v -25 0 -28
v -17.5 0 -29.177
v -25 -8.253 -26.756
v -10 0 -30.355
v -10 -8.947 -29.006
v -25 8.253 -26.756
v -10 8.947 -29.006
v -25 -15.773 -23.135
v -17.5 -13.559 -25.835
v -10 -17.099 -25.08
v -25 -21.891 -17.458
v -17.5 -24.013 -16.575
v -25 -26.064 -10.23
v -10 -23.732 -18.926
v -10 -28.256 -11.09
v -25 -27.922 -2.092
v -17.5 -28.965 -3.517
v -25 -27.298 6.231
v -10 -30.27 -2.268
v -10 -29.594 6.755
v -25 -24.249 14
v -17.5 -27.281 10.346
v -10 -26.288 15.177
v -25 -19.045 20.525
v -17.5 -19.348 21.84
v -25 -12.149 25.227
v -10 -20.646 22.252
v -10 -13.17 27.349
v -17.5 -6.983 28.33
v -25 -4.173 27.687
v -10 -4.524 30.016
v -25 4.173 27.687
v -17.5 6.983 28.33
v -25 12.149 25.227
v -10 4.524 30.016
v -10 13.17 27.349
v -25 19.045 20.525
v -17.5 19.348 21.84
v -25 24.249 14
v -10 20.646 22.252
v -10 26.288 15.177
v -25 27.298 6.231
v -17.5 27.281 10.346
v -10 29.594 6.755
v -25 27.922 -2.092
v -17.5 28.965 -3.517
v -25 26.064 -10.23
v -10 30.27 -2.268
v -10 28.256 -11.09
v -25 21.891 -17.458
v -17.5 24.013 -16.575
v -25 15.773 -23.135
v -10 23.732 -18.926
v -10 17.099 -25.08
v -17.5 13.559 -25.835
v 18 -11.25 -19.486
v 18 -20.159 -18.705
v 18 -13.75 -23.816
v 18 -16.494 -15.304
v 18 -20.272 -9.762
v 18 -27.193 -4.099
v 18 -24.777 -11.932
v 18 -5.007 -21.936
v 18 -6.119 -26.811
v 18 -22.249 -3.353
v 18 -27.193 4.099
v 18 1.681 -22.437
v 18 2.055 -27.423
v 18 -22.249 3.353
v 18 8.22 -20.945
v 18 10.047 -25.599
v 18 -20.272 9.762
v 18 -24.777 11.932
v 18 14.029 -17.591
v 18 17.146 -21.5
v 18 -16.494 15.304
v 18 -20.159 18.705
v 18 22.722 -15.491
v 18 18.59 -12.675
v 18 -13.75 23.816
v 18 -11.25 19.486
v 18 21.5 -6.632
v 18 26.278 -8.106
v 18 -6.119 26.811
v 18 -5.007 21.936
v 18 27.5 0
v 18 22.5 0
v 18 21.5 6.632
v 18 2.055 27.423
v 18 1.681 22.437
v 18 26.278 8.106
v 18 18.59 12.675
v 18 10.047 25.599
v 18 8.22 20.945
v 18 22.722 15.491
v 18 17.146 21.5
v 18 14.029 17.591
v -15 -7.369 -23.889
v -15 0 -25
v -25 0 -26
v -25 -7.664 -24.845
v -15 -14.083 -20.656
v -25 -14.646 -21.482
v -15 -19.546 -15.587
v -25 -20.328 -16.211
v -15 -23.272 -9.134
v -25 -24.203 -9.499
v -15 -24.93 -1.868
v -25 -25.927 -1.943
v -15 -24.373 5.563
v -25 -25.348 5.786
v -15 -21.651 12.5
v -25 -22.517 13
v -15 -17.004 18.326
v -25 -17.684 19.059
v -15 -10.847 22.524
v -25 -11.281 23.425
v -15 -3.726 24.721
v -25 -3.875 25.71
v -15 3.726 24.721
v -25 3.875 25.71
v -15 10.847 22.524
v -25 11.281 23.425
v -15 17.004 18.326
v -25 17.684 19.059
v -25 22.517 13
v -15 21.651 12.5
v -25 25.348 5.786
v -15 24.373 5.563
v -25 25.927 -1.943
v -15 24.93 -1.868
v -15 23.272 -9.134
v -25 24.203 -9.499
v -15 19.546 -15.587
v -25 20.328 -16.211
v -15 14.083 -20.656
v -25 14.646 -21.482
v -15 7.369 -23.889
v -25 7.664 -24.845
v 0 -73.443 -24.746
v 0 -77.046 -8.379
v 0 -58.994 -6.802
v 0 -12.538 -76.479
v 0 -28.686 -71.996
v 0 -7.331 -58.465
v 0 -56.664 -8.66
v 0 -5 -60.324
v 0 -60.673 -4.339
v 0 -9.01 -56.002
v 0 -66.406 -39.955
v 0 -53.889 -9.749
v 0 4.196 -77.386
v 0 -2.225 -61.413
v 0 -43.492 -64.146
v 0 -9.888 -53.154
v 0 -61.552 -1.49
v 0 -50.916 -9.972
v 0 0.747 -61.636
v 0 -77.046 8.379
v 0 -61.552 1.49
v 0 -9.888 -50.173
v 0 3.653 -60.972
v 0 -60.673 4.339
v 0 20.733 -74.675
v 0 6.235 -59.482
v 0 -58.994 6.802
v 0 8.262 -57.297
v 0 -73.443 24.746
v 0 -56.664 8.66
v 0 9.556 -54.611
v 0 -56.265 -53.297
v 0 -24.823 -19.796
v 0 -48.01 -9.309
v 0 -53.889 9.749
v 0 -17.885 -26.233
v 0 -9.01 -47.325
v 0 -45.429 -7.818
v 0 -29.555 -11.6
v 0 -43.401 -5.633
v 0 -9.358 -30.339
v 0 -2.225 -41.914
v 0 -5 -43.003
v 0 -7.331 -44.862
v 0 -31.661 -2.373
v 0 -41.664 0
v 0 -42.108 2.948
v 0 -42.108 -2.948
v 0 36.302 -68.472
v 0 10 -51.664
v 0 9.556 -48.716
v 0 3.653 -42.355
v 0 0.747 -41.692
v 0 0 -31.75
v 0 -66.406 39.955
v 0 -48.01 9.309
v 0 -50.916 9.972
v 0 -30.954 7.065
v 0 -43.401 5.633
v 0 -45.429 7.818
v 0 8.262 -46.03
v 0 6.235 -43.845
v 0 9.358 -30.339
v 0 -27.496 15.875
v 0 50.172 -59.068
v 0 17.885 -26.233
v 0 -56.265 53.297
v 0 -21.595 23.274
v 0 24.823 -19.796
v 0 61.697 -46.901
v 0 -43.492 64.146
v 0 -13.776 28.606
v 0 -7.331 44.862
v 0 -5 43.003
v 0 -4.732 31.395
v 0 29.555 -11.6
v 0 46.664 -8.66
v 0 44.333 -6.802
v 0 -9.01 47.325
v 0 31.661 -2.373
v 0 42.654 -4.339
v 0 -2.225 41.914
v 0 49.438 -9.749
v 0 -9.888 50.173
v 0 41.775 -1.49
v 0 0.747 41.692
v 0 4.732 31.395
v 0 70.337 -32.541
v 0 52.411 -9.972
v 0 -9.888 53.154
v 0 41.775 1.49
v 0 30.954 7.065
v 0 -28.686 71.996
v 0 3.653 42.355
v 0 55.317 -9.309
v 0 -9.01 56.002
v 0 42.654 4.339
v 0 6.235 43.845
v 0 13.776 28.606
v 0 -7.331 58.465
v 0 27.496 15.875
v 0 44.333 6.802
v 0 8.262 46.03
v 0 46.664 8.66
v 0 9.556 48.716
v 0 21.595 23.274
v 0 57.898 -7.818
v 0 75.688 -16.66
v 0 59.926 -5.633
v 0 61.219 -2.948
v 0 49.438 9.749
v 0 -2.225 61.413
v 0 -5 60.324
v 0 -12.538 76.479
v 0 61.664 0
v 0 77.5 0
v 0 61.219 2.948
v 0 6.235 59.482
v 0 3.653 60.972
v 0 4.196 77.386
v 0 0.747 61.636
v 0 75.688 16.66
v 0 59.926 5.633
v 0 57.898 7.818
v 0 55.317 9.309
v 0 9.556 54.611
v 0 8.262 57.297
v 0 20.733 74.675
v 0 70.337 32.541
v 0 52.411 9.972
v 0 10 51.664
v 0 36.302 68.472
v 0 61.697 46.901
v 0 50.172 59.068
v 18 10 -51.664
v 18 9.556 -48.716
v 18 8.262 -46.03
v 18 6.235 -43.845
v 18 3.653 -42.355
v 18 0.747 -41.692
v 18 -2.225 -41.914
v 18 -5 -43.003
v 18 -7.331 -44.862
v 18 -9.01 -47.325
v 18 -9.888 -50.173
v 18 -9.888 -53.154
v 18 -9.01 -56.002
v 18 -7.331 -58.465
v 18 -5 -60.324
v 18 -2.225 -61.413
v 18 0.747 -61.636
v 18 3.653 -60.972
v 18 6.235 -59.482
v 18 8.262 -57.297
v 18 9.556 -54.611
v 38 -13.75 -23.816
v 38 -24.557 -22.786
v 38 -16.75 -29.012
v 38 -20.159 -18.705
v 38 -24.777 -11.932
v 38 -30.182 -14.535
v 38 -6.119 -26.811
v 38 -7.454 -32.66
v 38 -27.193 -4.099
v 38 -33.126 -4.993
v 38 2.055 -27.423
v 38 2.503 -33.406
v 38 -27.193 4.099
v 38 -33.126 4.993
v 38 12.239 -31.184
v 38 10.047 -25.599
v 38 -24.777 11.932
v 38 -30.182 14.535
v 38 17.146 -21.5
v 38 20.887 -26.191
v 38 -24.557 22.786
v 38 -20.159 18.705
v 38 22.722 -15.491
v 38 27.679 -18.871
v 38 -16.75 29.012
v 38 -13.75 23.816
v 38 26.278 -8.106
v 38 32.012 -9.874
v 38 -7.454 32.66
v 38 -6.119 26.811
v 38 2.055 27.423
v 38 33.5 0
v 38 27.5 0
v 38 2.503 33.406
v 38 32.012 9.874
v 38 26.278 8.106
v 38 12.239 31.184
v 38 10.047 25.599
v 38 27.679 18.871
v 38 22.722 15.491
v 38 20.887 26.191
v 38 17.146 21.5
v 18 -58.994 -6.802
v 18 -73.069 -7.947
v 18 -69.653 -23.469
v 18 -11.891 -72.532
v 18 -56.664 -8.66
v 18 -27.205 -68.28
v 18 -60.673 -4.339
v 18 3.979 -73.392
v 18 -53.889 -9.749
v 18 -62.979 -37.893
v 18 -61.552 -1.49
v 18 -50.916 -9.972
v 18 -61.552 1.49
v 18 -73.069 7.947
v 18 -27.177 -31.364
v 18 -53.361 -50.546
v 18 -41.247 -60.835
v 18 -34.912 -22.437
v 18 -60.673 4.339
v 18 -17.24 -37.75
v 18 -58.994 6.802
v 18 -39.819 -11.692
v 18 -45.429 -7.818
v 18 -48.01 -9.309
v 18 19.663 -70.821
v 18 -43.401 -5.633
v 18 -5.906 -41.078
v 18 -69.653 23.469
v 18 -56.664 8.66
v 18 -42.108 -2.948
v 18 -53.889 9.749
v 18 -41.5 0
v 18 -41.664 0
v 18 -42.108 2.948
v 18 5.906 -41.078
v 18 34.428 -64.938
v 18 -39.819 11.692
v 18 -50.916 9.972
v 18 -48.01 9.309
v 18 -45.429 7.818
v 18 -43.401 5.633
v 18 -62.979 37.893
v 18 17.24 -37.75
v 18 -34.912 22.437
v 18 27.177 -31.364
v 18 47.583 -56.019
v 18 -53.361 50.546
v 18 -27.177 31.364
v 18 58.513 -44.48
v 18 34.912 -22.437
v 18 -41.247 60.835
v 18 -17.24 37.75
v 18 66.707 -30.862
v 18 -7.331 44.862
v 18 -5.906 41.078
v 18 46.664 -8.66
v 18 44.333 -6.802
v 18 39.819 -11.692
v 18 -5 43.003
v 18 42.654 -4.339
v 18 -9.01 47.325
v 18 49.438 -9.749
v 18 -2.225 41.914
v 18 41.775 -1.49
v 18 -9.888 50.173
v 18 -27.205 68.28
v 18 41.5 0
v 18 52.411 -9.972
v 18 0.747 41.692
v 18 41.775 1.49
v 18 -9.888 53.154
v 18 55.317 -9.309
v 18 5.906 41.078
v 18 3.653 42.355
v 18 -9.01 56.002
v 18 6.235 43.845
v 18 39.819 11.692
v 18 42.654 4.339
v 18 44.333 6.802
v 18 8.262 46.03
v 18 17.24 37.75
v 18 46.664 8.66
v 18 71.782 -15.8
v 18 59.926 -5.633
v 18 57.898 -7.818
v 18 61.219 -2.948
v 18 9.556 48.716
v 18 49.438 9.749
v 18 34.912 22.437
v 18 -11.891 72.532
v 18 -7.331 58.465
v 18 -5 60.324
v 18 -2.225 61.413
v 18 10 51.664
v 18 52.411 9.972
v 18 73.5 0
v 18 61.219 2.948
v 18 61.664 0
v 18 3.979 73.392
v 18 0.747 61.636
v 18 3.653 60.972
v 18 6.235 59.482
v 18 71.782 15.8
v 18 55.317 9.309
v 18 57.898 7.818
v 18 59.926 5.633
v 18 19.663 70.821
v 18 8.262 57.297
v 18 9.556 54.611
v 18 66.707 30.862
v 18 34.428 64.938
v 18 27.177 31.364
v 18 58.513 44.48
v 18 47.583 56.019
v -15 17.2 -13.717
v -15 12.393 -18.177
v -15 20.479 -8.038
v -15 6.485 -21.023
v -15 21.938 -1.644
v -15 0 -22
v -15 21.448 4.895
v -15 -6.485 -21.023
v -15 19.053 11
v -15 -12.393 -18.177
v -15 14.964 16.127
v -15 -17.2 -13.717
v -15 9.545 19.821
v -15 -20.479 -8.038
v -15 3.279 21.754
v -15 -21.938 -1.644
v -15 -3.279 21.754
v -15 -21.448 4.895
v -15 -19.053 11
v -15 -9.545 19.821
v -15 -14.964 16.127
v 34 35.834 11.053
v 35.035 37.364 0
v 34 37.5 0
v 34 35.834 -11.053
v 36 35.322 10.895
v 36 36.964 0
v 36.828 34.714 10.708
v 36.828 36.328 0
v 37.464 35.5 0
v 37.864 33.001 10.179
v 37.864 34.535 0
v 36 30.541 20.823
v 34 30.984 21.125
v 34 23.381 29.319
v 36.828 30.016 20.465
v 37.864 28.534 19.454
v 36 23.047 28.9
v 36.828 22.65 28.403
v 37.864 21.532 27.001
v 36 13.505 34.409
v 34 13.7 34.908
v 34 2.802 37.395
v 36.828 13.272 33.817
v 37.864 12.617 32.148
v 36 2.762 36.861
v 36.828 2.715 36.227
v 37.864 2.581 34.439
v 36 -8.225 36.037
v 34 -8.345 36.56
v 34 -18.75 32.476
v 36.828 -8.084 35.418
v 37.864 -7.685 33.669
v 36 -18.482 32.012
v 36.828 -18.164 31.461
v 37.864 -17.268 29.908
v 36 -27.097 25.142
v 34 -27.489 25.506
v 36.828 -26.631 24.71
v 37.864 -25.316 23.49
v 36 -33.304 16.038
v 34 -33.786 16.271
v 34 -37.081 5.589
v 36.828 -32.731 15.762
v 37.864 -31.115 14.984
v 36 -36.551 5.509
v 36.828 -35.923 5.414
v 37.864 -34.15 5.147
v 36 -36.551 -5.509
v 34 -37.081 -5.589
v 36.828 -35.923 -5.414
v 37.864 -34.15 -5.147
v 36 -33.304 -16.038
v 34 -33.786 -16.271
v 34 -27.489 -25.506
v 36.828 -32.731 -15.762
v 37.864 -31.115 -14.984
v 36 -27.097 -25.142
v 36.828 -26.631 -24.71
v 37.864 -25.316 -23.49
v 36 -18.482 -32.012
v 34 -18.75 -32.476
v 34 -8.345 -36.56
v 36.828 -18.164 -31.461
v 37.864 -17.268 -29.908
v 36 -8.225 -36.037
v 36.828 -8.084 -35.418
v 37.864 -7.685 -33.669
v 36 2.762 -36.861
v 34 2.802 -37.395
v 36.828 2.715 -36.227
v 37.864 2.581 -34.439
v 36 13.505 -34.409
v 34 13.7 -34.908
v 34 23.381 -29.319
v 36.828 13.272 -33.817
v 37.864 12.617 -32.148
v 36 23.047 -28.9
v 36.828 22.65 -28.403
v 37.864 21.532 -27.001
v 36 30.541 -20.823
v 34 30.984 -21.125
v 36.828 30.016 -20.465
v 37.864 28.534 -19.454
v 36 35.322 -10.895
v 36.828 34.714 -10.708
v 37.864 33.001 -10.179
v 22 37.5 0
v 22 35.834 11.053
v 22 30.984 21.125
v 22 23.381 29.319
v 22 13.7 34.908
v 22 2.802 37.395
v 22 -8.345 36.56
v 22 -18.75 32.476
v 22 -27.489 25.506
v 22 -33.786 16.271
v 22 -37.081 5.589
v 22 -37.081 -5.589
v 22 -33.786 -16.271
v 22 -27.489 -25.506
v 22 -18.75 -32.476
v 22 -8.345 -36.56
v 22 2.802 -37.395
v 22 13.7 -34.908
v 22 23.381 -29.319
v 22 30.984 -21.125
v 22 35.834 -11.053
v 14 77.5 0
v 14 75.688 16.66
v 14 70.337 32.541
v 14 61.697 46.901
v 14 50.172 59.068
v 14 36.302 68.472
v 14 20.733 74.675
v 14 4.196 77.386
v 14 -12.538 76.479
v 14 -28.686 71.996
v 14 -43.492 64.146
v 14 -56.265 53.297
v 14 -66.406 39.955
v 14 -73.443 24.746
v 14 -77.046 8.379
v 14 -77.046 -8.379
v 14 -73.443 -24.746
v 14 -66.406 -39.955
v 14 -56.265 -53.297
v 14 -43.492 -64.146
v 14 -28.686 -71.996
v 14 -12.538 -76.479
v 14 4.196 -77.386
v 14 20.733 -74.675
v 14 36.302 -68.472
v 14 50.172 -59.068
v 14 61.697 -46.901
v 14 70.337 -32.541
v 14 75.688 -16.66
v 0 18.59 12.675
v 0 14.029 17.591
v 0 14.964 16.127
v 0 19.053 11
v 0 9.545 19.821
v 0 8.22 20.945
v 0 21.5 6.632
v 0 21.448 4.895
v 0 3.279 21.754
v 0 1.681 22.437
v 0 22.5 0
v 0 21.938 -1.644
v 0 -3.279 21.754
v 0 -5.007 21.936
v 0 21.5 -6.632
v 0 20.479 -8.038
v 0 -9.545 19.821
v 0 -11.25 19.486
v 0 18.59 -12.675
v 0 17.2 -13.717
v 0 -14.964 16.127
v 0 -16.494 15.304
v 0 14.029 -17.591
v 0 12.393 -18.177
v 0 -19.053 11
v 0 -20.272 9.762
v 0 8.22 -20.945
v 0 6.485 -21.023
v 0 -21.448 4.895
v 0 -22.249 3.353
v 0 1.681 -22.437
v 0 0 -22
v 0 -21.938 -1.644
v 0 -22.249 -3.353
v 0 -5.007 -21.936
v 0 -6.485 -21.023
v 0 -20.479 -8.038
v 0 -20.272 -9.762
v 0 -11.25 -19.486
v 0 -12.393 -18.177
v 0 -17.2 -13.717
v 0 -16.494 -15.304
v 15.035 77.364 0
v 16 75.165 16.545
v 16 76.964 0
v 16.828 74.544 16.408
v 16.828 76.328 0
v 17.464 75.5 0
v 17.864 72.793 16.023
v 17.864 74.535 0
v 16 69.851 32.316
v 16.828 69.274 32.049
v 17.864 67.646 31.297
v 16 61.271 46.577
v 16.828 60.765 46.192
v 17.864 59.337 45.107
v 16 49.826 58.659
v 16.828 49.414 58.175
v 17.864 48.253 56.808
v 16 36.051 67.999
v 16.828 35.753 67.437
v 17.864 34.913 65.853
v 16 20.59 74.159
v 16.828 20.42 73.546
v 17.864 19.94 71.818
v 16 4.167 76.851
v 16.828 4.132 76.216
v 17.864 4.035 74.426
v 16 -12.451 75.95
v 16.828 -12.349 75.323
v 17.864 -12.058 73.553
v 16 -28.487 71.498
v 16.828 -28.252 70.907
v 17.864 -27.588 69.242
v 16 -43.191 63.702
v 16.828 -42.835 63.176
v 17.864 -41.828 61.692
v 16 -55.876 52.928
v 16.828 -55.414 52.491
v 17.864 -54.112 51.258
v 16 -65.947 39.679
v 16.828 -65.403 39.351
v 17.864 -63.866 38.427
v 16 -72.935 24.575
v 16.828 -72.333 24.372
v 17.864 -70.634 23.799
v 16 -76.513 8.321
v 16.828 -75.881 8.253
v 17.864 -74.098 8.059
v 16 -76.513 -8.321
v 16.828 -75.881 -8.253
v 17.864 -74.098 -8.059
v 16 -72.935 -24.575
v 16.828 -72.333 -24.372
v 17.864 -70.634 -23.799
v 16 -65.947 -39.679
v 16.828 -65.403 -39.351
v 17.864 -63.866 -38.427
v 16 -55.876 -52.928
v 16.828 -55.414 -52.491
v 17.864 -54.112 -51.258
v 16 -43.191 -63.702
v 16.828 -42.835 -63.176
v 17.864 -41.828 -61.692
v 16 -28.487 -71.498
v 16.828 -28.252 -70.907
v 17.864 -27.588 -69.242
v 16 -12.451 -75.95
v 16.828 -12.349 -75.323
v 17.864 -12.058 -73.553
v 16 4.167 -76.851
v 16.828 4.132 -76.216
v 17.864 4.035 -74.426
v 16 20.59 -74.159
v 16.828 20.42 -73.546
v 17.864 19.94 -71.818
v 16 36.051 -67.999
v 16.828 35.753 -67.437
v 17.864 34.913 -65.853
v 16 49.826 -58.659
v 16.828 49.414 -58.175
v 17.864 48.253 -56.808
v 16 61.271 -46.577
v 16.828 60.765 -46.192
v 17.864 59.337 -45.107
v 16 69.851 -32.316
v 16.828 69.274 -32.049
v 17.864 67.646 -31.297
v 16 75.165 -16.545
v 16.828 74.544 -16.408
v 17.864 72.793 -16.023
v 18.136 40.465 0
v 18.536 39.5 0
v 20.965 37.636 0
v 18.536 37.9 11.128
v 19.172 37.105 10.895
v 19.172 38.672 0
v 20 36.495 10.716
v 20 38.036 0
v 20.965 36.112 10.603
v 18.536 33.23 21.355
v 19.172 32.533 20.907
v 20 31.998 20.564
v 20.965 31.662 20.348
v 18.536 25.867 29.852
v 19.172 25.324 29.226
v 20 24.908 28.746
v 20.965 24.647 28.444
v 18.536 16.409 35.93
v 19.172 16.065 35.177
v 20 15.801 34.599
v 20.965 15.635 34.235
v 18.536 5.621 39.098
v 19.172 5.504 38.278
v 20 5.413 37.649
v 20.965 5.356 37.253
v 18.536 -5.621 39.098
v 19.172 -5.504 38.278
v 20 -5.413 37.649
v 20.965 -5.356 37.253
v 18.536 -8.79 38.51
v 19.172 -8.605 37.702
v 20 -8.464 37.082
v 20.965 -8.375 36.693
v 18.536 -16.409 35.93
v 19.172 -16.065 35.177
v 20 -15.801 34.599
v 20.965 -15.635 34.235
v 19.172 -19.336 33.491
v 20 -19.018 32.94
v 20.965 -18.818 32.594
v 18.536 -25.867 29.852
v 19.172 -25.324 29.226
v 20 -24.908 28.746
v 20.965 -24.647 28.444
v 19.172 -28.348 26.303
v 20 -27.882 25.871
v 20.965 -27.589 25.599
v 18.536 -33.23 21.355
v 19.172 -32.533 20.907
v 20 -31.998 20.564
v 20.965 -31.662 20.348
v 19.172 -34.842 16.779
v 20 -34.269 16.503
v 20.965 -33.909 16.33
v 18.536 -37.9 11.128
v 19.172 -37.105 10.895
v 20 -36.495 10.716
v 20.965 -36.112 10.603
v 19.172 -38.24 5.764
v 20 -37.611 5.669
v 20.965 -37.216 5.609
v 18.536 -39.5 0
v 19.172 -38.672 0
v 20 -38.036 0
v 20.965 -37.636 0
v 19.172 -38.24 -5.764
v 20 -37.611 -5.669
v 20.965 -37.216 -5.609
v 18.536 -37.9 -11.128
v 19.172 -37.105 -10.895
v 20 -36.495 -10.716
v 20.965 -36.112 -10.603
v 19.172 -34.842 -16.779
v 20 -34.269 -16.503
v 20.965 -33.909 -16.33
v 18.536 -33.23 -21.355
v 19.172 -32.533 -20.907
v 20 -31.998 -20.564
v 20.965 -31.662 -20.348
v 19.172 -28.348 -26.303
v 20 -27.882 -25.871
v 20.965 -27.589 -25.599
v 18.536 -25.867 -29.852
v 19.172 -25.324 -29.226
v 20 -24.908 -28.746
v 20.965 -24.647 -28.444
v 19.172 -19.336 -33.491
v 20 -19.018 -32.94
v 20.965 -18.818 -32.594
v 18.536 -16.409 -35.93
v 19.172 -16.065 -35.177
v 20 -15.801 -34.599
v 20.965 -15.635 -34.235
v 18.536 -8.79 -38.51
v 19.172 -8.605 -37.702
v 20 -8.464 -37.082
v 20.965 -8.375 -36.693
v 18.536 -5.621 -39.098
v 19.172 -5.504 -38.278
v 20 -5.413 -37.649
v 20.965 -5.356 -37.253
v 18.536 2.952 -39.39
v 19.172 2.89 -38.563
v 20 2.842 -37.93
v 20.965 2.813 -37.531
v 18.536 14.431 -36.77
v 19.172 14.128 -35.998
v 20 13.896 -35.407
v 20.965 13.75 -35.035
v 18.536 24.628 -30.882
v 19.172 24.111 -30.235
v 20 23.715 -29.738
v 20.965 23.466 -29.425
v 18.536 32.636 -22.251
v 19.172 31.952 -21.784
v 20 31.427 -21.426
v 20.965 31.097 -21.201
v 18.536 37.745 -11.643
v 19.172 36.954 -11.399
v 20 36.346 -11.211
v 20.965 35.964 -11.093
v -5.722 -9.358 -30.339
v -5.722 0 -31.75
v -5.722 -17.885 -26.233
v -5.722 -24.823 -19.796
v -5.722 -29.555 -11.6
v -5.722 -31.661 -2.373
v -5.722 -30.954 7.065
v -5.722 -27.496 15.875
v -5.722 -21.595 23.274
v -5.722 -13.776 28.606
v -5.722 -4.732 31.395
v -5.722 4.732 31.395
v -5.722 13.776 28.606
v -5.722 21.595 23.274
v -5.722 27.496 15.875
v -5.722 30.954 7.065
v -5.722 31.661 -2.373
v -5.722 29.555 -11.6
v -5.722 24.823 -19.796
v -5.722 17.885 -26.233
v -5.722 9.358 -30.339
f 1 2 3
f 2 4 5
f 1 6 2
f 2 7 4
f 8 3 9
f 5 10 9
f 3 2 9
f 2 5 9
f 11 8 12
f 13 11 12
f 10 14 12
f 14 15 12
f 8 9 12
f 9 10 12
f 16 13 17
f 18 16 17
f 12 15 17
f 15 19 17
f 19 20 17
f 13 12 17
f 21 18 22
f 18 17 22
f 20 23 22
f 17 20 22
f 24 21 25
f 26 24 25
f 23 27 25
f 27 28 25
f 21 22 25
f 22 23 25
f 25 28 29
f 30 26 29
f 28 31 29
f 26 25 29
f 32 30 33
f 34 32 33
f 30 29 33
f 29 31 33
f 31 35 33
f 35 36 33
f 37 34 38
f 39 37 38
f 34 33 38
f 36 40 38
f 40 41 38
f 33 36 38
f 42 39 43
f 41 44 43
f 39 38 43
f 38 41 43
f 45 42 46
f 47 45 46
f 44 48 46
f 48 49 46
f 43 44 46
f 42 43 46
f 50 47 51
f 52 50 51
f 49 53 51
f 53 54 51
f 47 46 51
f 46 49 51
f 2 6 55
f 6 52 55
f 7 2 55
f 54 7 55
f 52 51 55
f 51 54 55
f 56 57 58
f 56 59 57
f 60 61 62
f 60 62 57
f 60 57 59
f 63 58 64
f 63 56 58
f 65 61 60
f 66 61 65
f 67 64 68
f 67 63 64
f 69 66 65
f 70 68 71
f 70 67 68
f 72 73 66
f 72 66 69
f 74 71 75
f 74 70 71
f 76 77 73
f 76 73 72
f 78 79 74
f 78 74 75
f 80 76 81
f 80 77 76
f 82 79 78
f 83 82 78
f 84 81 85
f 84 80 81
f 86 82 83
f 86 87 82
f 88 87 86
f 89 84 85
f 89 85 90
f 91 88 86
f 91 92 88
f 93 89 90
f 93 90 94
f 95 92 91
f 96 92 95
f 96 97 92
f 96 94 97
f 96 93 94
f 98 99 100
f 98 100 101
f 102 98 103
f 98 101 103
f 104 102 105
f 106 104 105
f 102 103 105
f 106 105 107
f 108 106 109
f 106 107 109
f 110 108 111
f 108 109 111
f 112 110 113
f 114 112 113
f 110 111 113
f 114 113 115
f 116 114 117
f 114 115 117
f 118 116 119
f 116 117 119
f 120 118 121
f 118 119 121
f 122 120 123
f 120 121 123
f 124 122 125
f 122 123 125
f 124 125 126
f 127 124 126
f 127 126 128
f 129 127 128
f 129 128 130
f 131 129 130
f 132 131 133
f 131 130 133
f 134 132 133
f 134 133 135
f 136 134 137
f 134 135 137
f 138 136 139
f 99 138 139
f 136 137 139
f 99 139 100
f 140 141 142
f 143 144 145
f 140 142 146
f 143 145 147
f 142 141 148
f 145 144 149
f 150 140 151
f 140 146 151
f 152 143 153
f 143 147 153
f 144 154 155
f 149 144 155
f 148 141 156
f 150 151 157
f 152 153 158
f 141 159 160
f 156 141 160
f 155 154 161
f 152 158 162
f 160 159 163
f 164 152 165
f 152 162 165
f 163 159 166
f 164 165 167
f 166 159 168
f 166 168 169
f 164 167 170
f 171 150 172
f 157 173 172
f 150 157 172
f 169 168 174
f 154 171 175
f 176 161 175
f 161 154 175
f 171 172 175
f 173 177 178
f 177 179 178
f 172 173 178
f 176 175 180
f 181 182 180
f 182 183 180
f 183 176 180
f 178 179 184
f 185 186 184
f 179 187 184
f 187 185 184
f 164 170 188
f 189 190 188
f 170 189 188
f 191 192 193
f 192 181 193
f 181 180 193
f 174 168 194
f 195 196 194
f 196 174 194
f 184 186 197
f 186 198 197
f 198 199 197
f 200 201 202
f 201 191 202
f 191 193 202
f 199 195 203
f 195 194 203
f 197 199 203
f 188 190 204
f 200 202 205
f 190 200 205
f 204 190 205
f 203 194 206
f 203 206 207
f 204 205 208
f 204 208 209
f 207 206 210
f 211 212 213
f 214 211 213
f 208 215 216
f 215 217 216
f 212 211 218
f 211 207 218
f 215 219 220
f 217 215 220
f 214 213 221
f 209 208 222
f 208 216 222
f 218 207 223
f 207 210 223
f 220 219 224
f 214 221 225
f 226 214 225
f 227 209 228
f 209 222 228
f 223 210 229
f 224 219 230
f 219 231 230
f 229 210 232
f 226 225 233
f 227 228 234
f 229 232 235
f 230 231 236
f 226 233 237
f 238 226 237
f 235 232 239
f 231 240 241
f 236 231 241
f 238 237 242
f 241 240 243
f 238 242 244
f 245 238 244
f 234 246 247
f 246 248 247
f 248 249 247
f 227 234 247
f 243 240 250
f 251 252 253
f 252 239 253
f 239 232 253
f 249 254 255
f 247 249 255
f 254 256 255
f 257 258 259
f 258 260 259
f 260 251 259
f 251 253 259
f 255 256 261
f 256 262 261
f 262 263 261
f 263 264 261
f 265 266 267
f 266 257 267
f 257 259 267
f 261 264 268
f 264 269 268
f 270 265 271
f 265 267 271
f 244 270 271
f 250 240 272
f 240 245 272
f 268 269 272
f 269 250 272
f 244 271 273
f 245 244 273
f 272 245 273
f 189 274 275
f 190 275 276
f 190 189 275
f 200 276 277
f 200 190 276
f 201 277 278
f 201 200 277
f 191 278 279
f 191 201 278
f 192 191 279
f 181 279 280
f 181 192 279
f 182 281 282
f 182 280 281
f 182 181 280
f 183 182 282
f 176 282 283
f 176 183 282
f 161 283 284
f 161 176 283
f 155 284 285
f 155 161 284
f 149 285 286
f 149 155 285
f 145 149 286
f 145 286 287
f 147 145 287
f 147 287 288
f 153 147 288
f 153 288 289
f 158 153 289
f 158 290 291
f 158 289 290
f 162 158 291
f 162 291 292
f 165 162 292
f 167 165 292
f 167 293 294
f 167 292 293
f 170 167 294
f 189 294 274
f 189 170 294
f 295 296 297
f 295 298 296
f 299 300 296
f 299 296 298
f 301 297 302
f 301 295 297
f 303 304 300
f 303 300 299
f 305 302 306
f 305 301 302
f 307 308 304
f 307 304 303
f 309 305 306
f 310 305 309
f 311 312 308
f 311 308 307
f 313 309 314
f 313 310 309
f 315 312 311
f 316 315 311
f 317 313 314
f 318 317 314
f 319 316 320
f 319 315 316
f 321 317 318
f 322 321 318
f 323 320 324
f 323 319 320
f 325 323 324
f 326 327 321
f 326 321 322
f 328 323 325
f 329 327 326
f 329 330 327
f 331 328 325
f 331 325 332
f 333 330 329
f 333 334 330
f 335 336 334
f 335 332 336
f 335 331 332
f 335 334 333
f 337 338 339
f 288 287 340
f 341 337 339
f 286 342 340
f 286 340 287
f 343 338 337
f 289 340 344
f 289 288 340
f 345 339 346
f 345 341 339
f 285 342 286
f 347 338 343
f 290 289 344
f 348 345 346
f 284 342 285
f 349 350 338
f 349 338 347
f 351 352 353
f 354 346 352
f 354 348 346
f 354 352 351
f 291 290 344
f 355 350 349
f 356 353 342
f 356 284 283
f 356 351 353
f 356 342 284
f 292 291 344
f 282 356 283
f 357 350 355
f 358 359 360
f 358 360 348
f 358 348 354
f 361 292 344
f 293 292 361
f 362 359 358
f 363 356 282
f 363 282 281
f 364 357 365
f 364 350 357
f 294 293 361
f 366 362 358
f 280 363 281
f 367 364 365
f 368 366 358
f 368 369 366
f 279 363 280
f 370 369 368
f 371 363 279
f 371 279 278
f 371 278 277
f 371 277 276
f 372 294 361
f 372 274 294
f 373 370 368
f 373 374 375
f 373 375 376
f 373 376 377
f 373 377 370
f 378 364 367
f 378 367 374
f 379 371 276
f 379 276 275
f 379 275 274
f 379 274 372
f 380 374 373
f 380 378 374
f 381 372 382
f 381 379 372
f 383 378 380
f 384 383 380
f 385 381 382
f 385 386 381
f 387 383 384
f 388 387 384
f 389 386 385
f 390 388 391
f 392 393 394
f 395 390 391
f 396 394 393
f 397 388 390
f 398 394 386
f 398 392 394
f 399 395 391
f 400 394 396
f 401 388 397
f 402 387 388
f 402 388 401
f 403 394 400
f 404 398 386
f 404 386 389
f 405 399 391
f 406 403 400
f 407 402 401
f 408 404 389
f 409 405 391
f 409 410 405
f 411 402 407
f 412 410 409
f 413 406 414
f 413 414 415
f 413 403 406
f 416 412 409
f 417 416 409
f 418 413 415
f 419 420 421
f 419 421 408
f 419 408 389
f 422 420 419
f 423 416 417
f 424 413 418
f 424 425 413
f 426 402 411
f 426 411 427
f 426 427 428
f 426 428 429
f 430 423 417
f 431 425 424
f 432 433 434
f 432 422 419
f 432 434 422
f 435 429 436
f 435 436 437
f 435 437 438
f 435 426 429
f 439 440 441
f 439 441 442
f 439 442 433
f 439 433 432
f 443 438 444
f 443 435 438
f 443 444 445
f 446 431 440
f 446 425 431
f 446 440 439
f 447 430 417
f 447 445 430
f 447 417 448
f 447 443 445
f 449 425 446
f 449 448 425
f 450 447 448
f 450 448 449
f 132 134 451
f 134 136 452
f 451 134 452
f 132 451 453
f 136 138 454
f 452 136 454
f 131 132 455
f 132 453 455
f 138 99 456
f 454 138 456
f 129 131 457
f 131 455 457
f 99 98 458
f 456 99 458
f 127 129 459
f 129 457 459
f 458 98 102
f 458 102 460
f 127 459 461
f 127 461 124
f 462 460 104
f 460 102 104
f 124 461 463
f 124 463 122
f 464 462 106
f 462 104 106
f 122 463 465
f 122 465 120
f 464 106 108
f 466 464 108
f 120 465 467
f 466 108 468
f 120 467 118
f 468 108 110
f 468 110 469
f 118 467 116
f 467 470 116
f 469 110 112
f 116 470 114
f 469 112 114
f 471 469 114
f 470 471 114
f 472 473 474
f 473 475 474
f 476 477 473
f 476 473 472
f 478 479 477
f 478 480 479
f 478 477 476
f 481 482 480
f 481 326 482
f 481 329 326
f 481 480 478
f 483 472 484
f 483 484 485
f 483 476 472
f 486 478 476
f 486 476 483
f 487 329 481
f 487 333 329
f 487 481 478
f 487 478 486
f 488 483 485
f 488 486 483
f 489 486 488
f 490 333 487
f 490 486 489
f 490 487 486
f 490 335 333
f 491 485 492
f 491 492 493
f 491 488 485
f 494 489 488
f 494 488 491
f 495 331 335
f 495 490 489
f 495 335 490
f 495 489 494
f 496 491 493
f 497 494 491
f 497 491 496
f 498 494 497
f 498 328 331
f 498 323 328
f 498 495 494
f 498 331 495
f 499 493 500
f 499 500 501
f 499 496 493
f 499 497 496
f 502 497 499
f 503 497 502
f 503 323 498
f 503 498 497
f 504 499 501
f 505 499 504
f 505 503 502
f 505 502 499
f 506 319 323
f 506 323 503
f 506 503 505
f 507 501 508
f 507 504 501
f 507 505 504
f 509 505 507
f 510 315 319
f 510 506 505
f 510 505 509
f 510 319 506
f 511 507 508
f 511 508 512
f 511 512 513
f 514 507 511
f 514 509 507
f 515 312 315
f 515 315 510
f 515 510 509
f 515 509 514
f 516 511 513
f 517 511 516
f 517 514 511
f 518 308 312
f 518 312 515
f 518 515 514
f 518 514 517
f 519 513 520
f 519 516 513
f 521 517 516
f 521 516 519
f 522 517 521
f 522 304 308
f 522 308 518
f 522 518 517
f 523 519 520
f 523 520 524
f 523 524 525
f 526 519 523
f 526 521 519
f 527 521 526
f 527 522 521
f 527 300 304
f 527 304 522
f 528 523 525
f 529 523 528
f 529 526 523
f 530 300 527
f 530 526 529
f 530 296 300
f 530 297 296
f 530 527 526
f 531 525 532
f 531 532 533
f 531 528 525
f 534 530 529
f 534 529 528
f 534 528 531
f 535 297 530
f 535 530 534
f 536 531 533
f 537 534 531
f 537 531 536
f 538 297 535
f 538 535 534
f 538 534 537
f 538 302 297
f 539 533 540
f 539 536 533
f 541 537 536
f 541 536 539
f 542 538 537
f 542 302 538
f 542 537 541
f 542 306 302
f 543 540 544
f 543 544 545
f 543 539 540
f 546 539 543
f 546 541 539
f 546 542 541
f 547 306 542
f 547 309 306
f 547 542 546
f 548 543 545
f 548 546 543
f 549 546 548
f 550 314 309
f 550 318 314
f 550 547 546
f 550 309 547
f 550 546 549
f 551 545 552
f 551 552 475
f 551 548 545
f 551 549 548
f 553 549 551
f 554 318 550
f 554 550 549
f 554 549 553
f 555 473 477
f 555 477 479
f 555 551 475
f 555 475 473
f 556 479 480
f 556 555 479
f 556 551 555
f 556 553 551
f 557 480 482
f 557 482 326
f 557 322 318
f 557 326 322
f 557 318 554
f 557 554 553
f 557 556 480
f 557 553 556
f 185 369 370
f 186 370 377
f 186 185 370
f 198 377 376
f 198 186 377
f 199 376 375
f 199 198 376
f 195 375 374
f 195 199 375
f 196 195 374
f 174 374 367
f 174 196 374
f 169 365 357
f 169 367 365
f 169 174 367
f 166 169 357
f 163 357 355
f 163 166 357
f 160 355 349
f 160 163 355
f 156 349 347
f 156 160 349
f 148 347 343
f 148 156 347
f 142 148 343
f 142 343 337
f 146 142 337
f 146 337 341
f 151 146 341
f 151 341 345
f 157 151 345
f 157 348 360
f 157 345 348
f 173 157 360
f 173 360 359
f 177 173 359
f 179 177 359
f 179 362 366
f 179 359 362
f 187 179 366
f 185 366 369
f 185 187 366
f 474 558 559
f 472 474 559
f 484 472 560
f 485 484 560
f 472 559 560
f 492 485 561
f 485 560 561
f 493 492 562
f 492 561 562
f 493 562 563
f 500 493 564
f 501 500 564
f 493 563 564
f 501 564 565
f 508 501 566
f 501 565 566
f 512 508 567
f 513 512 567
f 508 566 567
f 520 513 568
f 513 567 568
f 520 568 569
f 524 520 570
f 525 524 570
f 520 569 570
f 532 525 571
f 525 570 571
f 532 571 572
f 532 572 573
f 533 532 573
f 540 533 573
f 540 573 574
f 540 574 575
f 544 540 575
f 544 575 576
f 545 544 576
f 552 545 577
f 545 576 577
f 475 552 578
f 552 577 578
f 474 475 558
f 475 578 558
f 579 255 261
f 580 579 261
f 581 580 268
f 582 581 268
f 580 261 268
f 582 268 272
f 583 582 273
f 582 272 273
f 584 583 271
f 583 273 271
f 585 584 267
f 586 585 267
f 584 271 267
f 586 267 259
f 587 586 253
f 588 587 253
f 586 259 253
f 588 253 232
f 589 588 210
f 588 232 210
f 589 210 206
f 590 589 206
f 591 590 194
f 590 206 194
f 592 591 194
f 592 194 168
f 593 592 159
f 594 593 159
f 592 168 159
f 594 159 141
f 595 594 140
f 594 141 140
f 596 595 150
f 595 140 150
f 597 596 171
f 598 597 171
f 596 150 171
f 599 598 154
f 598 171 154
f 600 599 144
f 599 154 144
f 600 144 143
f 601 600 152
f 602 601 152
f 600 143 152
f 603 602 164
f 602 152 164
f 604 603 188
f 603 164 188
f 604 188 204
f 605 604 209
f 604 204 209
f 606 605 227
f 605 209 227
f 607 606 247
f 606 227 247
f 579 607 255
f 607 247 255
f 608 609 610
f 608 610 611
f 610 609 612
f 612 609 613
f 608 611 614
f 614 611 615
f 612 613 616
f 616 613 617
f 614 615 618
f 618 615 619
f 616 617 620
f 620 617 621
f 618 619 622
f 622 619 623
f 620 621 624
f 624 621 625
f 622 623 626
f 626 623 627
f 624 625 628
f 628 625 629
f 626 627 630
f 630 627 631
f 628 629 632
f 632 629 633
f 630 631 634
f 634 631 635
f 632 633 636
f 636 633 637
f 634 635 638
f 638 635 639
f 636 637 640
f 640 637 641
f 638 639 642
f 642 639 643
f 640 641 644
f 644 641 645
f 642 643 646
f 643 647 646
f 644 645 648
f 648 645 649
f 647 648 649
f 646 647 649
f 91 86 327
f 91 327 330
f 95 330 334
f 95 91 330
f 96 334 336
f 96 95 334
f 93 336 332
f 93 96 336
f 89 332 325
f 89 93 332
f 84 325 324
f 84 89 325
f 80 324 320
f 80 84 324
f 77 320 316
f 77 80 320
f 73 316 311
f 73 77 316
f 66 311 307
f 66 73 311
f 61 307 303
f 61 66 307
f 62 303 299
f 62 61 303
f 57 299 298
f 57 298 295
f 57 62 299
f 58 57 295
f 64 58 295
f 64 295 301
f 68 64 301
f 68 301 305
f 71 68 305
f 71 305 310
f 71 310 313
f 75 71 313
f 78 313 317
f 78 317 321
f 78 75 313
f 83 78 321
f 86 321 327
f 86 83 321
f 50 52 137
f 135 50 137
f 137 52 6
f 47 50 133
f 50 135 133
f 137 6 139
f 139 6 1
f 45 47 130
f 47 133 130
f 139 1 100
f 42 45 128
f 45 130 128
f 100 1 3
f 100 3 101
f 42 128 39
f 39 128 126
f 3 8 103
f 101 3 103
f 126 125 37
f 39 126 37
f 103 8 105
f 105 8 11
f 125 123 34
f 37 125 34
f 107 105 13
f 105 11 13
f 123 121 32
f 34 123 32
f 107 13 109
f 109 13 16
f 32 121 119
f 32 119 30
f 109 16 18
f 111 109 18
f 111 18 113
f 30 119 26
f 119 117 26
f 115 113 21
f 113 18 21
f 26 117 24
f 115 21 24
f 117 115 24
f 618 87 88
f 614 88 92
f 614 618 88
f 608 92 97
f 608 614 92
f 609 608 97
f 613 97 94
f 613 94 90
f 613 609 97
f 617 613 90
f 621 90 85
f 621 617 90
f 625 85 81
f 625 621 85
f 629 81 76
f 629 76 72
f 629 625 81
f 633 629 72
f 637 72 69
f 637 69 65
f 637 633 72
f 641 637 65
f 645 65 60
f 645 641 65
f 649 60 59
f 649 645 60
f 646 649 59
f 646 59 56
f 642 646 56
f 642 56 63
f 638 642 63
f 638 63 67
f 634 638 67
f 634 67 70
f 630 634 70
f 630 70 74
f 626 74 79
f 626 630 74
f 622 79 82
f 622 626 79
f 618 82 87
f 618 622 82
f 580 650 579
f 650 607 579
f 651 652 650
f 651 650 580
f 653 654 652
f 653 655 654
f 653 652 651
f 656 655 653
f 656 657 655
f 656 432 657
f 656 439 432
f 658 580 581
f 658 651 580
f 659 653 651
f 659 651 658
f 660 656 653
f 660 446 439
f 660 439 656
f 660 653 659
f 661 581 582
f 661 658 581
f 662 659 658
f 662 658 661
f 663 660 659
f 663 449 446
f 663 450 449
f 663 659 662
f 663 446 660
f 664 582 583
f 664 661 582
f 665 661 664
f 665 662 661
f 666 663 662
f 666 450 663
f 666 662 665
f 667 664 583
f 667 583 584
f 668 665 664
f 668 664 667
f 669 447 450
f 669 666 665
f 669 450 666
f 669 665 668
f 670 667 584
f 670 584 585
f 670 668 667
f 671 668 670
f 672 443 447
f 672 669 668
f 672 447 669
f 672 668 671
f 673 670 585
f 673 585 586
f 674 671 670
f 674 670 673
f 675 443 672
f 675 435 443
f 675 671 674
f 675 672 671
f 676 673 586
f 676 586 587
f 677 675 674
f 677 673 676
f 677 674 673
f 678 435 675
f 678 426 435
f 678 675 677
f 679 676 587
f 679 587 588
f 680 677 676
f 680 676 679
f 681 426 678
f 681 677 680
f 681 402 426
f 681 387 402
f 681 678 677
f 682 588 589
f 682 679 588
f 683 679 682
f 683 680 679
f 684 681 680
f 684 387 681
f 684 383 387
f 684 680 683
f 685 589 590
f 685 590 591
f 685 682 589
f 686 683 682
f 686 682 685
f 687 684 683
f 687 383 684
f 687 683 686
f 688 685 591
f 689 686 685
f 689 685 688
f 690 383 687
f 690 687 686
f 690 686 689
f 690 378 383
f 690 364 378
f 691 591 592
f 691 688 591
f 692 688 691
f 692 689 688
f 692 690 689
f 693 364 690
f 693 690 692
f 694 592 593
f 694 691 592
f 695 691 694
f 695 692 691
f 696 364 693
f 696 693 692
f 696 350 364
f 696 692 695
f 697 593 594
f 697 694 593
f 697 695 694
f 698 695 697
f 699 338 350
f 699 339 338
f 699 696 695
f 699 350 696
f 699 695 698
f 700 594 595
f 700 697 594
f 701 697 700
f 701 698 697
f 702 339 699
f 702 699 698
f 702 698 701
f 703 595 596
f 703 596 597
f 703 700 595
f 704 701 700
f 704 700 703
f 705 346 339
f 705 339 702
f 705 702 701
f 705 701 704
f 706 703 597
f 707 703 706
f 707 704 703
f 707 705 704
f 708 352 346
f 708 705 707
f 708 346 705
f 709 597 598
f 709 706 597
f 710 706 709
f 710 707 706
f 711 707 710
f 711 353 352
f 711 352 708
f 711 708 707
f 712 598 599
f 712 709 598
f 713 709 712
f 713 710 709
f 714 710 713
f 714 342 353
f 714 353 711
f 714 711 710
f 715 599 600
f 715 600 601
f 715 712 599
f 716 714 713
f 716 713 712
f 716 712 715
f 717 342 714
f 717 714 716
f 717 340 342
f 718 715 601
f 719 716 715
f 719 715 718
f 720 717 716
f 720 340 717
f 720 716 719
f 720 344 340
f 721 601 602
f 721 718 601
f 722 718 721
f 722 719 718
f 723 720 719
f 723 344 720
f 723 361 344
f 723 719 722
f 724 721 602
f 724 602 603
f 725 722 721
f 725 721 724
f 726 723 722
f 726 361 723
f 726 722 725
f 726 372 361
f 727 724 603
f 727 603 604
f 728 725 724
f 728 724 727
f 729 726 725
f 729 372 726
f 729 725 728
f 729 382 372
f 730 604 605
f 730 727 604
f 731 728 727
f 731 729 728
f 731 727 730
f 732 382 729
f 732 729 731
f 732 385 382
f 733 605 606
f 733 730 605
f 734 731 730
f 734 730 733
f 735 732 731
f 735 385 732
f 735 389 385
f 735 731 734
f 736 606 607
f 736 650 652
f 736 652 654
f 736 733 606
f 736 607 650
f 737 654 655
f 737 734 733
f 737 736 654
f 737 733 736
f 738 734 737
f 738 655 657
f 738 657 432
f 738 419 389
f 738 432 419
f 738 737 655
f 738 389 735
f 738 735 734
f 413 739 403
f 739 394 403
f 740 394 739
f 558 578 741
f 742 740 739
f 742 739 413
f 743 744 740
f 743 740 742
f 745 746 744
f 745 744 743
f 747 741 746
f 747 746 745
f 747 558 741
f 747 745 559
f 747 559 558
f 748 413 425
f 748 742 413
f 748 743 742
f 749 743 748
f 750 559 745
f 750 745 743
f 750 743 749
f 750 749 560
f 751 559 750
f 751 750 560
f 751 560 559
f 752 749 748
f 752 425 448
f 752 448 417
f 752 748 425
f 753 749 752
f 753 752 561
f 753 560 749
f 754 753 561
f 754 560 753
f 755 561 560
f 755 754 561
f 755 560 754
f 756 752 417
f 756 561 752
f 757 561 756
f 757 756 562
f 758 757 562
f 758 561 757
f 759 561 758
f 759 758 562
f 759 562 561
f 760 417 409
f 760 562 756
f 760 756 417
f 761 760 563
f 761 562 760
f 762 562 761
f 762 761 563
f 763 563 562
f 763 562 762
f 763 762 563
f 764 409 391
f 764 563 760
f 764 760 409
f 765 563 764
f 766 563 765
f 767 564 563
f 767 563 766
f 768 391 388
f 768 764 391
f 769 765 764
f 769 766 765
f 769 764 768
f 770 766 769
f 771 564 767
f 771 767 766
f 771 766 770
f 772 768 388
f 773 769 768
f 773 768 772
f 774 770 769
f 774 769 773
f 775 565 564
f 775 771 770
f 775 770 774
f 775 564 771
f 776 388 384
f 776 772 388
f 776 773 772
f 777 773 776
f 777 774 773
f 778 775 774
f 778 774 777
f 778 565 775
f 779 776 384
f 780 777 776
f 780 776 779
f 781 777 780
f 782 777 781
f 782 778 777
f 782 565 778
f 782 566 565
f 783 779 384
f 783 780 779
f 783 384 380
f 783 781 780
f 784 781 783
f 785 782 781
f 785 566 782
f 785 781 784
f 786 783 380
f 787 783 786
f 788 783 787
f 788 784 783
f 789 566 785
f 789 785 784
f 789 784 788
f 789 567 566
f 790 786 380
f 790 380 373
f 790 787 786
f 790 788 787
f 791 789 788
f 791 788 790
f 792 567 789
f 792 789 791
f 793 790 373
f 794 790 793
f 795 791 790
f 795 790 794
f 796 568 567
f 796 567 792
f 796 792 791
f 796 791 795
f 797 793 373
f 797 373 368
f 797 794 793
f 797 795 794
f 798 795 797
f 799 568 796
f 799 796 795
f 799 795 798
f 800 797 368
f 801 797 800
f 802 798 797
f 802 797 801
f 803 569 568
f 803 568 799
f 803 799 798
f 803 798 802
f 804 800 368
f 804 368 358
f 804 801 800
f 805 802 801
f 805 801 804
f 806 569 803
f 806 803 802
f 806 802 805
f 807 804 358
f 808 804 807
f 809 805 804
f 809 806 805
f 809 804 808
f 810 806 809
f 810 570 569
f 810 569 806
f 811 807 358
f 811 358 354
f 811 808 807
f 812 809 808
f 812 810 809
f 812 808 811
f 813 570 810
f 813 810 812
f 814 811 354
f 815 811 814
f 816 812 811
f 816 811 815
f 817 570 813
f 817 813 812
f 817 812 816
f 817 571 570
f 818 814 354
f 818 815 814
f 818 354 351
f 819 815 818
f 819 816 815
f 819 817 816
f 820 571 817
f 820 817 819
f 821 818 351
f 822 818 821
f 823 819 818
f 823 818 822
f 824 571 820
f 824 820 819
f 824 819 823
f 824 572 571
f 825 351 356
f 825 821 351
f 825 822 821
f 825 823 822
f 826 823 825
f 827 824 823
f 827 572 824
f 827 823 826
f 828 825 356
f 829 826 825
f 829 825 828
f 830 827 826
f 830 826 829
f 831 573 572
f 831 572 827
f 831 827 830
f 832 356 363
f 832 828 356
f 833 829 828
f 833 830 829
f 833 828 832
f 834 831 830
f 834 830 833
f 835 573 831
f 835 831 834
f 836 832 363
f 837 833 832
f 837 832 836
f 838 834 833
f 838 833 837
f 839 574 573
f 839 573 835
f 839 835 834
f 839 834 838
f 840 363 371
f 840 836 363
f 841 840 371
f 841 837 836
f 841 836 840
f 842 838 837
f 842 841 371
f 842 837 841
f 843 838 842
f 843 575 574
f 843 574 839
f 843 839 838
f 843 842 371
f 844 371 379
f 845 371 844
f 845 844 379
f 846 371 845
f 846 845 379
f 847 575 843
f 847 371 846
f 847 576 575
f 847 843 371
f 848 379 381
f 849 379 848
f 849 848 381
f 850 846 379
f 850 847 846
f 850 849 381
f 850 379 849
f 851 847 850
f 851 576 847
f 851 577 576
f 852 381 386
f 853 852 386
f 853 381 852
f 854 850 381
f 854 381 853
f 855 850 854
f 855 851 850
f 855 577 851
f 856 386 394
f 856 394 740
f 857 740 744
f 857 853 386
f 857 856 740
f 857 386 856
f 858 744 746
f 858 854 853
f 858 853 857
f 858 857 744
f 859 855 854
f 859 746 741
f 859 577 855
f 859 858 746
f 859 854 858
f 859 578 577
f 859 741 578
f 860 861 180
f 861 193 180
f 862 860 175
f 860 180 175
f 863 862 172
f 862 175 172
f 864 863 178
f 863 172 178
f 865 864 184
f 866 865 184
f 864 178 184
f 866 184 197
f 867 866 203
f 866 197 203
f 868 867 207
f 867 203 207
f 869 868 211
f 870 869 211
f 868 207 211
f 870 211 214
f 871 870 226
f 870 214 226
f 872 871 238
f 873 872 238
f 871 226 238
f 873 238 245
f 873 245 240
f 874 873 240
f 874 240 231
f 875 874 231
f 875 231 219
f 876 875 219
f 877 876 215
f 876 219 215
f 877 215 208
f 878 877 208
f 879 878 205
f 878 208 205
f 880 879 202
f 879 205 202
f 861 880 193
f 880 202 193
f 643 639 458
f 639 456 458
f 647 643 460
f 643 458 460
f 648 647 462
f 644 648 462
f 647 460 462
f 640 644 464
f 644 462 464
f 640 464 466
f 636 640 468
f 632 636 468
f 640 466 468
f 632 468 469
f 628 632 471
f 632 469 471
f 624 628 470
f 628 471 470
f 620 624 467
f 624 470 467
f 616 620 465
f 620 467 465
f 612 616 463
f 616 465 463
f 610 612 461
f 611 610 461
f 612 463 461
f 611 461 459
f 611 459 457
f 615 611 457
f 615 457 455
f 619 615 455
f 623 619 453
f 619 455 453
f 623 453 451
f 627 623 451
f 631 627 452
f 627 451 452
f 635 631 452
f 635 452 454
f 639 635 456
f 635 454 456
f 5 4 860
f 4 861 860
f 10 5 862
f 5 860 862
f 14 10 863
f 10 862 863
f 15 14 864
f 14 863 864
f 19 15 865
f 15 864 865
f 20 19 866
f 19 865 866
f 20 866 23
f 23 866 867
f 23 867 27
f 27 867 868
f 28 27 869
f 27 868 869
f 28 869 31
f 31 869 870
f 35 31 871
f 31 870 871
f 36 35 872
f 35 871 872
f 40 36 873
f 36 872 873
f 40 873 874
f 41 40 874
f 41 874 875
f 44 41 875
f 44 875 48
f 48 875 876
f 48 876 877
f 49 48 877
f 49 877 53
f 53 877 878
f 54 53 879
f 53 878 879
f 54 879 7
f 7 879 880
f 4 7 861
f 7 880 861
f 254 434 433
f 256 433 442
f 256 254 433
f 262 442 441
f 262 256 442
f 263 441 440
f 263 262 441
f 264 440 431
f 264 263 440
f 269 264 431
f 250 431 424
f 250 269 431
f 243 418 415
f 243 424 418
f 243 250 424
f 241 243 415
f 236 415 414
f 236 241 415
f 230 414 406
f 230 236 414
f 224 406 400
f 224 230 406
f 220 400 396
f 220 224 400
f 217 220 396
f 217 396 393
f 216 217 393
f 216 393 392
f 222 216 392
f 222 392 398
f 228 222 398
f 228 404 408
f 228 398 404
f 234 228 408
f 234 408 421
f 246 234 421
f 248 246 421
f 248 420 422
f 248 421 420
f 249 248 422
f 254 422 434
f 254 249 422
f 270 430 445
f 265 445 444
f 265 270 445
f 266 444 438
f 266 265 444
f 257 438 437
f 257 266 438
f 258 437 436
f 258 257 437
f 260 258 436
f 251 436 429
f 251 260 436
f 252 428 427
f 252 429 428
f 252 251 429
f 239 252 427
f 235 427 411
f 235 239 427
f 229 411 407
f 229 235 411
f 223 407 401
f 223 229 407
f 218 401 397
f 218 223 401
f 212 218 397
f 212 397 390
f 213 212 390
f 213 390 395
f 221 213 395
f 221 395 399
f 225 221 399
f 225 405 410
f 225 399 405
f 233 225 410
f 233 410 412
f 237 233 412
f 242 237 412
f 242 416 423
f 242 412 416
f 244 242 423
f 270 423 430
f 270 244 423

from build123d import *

# Parameters (mm, degrees)
F0_R     = 77.5
F0_R_2   = 22.5
F1_DEPTH = 18
F2_R     = 37.5
F2_R_2   = 27.5
F3_DEPTH = 20
F4_R     = 4
F7_R     = 10
F8_DEPTH = 25


with BuildPart() as f1:
    # F0 (on Right) → F1 (new body)
    with BuildSketch(Plane.YZ):
        Circle(F0_R)
        Circle(F0_R_2, mode=Mode.SUBTRACT)
    extrude(amount=F1_DEPTH)

    # F2 (on face) → F3 (join)
    with BuildSketch(Plane.YZ.offset(18)):
        Circle(F2_R)
        Circle(F2_R_2, mode=Mode.SUBTRACT)
    extrude(amount=F3_DEPTH)

    # F4
    f4_edges = [f1.edges().sort_by_distance(p)[0] for p in [
        (28, 37.5, 0),
        (18, -37.5, 0),
        (38, -37.5, 0),
        (18, -77.5, 0),
    ]]
    fillet(f4_edges, radius=F4_R)

    # F5 (on Front) → F6 (revolve)
    with BuildSketch(Plane.XZ):
        Polygon((-5.721824, -31.75), (0, -31.75), (0, -22), (-15, -22), (-15, -25), (-25, -26), (-25, -28), (-10, -30.354747), align=None)
    revolve(axis=Axis((-7.5, 0, 0), (-1, 0, 0)))

    # F7 (on Right) → F8 (cut)
    with BuildSketch(Plane.YZ):
        with Locations((0, 51.6636)):
            Circle(F7_R)
        with Locations((-51.6636, 0)):
            Circle(F7_R)
        with Locations((0, -51.6636)):
            Circle(F7_R)
        with Locations((51.6636, 0)):
            Circle(F7_R)
    extrude(amount=F8_DEPTH, mode=Mode.SUBTRACT)


solid = f1.part
